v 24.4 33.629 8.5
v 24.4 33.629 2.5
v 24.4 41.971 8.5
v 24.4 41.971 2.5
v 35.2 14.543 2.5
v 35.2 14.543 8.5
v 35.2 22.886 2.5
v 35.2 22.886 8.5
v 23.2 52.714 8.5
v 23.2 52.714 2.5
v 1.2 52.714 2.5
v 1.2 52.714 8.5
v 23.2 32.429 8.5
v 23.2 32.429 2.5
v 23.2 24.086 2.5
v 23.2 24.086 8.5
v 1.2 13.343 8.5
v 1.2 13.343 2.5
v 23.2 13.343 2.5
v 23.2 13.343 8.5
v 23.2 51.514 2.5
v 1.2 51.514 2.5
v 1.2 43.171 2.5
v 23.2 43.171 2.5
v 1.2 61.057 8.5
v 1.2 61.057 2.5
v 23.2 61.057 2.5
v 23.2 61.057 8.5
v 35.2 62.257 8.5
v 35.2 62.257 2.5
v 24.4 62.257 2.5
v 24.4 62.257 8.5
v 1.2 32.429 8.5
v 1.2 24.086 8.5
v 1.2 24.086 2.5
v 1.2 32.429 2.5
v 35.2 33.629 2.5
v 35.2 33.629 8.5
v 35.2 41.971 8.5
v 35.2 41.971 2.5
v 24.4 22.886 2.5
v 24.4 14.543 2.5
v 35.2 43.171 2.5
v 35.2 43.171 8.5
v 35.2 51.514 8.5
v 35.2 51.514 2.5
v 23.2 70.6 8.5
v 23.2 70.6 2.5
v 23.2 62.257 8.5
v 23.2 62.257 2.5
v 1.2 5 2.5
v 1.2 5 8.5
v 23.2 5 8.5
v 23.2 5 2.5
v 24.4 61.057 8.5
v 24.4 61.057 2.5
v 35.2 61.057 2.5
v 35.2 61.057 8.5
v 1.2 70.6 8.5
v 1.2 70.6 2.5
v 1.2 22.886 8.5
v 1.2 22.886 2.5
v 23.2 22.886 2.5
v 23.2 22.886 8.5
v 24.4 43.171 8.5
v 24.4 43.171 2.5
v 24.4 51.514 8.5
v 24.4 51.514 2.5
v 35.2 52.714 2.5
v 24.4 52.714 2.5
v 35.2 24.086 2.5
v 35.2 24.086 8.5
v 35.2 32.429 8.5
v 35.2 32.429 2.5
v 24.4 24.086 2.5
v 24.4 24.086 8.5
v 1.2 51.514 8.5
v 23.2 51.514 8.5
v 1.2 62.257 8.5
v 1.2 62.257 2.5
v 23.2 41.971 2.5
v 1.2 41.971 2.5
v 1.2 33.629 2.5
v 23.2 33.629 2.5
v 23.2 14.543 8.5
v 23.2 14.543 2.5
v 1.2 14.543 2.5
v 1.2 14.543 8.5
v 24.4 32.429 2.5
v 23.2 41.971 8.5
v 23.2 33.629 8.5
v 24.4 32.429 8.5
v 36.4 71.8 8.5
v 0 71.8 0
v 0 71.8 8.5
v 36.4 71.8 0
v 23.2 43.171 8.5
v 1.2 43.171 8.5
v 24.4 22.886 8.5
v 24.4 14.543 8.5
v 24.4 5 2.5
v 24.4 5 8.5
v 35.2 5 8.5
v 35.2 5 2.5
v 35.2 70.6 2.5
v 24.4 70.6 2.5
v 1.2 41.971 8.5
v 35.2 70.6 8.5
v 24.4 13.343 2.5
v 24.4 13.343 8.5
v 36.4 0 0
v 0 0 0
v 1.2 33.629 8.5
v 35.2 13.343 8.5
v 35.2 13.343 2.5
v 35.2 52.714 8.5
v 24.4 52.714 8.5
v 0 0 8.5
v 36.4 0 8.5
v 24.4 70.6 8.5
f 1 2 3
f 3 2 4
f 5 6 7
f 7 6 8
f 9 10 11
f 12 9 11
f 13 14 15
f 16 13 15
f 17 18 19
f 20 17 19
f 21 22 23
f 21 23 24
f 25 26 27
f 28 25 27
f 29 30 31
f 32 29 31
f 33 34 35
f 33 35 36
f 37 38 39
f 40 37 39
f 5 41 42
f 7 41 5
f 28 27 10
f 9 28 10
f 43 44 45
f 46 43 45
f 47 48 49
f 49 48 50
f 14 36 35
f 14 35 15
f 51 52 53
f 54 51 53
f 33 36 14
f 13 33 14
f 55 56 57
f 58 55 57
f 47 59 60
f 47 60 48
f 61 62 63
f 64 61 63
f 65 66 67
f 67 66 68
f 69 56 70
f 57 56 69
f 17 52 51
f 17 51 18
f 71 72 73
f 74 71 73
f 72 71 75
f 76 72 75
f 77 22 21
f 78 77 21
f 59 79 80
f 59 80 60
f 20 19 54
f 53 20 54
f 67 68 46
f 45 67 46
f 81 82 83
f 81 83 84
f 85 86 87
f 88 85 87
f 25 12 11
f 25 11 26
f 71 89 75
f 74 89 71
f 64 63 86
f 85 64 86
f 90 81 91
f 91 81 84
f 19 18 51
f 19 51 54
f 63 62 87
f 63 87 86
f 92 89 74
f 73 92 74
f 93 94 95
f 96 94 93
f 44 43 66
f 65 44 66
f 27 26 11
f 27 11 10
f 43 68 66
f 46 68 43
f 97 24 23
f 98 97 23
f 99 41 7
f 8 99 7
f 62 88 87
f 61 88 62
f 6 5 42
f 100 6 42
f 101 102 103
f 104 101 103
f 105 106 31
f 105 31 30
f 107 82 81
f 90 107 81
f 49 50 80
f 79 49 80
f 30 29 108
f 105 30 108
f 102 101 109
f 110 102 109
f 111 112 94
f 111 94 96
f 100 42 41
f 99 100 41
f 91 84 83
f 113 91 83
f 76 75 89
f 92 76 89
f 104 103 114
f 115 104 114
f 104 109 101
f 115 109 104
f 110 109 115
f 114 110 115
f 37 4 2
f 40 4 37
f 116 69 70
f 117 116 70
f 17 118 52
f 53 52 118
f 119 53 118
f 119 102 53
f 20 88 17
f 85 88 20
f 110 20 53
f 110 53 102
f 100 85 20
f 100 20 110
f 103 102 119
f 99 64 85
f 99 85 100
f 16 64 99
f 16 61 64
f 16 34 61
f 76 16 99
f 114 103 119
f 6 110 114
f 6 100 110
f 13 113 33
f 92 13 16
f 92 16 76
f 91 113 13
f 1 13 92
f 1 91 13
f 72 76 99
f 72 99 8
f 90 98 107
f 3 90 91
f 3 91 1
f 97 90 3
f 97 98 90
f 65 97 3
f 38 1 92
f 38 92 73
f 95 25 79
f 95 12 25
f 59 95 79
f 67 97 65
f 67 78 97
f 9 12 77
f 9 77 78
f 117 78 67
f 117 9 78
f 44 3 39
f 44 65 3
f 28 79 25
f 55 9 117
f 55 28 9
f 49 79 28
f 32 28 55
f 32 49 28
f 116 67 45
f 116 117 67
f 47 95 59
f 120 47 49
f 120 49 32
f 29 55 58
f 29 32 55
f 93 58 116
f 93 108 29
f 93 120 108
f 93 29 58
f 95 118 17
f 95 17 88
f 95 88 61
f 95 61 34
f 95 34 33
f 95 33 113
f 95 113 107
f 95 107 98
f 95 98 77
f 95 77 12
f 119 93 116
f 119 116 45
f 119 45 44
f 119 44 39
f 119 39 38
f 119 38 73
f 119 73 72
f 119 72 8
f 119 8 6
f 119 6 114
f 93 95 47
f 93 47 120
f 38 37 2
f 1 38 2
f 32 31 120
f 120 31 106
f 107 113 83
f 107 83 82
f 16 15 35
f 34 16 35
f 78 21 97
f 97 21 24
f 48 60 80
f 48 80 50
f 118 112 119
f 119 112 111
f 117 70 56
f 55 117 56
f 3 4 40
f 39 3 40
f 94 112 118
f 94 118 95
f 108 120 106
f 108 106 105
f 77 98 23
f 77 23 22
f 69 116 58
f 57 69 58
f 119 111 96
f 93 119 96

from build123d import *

# Parameters (mm, degrees)
F0_W     = 36.4
F0_H     = 71.8
F1_DEPTH = 8.5
F2_W     = 34
F2_H     = 65.6
F3_DEPTH = 6
F5_DEPTH = 6


with BuildPart() as f1:
    # F0 (on Top) → F1 (new body)
    with BuildSketch(Plane.XY):
        with Locations((18.2, 35.9)):
            Rectangle(F0_W, F0_H)
    extrude(amount=F1_DEPTH)

    # F2 (on face) → F3 (cut)
    with BuildSketch(Plane.XY.offset(8.5)):
        with Locations((18.2, 37.8)):
            Rectangle(F2_W, F2_H)
    extrude(amount=-F3_DEPTH, mode=Mode.SUBTRACT)

    # F4 (on face) → F5 (join)
    with BuildSketch(Plane.XY.offset(2.5)):
        Polygon((24.4, 70.6), (23.2, 70.6), (23.2, 62.257143), (13.2, 62.257143), (12, 62.257143), (1.2, 62.257143), (1.2, 61.057143), (12, 61.057143), (13.2, 61.057143), (23.2, 61.057143), (23.2, 52.714286), (13.2, 52.714286), (12, 52.714286), (1.2, 52.714286), (1.2, 51.514286), (12, 51.514286), (13.2, 51.514286), (23.2, 51.514286), (23.2, 43.171429), (13.2, 43.171429), (12, 43.171429), (1.2, 43.171429), (1.2, 41.971429), (12, 41.971429), (13.2, 41.971429), (23.2, 41.971429), (23.2, 33.628571), (13.2, 33.628571), (12, 33.628571), (1.2, 33.628571), (1.2, 32.428571), (12, 32.428571), (13.2, 32.428571), (23.2, 32.428571), (23.2, 24.085714), (13.2, 24.085714), (12, 24.085714), (1.2, 24.085714), (1.2, 22.885714), (12, 22.885714), (13.2, 22.885714), (23.2, 22.885714), (23.2, 14.542857), (13.2, 14.542857), (12, 14.542857), (1.2, 14.542857), (1.2, 13.342857), (12, 13.342857), (13.2, 13.342857), (23.2, 13.342857), (23.2, 5), (24.4, 5), (24.4, 13.342857), (35.2, 13.342857), (35.2, 14.542857), (24.4, 14.542857), (24.4, 22.885714), (35.2, 22.885714), (35.2, 24.085714), (24.4, 24.085714), (24.4, 32.428571), (35.2, 32.428571), (35.2, 33.628571), (24.4, 33.628571), (24.4, 41.971429), (35.2, 41.971429), (35.2, 43.171429), (24.4, 43.171429), (24.4, 51.514286), (35.2, 51.514286), (35.2, 52.714286), (24.4, 52.714286), (24.4, 61.057143), (35.2, 61.057143), (35.2, 62.257143), (24.4, 62.257143), align=None)
    extrude(amount=F5_DEPTH)


with BuildPart() as f6_1:
    # F6: copy of F1
    add(f1.part)


solid = f1.part
